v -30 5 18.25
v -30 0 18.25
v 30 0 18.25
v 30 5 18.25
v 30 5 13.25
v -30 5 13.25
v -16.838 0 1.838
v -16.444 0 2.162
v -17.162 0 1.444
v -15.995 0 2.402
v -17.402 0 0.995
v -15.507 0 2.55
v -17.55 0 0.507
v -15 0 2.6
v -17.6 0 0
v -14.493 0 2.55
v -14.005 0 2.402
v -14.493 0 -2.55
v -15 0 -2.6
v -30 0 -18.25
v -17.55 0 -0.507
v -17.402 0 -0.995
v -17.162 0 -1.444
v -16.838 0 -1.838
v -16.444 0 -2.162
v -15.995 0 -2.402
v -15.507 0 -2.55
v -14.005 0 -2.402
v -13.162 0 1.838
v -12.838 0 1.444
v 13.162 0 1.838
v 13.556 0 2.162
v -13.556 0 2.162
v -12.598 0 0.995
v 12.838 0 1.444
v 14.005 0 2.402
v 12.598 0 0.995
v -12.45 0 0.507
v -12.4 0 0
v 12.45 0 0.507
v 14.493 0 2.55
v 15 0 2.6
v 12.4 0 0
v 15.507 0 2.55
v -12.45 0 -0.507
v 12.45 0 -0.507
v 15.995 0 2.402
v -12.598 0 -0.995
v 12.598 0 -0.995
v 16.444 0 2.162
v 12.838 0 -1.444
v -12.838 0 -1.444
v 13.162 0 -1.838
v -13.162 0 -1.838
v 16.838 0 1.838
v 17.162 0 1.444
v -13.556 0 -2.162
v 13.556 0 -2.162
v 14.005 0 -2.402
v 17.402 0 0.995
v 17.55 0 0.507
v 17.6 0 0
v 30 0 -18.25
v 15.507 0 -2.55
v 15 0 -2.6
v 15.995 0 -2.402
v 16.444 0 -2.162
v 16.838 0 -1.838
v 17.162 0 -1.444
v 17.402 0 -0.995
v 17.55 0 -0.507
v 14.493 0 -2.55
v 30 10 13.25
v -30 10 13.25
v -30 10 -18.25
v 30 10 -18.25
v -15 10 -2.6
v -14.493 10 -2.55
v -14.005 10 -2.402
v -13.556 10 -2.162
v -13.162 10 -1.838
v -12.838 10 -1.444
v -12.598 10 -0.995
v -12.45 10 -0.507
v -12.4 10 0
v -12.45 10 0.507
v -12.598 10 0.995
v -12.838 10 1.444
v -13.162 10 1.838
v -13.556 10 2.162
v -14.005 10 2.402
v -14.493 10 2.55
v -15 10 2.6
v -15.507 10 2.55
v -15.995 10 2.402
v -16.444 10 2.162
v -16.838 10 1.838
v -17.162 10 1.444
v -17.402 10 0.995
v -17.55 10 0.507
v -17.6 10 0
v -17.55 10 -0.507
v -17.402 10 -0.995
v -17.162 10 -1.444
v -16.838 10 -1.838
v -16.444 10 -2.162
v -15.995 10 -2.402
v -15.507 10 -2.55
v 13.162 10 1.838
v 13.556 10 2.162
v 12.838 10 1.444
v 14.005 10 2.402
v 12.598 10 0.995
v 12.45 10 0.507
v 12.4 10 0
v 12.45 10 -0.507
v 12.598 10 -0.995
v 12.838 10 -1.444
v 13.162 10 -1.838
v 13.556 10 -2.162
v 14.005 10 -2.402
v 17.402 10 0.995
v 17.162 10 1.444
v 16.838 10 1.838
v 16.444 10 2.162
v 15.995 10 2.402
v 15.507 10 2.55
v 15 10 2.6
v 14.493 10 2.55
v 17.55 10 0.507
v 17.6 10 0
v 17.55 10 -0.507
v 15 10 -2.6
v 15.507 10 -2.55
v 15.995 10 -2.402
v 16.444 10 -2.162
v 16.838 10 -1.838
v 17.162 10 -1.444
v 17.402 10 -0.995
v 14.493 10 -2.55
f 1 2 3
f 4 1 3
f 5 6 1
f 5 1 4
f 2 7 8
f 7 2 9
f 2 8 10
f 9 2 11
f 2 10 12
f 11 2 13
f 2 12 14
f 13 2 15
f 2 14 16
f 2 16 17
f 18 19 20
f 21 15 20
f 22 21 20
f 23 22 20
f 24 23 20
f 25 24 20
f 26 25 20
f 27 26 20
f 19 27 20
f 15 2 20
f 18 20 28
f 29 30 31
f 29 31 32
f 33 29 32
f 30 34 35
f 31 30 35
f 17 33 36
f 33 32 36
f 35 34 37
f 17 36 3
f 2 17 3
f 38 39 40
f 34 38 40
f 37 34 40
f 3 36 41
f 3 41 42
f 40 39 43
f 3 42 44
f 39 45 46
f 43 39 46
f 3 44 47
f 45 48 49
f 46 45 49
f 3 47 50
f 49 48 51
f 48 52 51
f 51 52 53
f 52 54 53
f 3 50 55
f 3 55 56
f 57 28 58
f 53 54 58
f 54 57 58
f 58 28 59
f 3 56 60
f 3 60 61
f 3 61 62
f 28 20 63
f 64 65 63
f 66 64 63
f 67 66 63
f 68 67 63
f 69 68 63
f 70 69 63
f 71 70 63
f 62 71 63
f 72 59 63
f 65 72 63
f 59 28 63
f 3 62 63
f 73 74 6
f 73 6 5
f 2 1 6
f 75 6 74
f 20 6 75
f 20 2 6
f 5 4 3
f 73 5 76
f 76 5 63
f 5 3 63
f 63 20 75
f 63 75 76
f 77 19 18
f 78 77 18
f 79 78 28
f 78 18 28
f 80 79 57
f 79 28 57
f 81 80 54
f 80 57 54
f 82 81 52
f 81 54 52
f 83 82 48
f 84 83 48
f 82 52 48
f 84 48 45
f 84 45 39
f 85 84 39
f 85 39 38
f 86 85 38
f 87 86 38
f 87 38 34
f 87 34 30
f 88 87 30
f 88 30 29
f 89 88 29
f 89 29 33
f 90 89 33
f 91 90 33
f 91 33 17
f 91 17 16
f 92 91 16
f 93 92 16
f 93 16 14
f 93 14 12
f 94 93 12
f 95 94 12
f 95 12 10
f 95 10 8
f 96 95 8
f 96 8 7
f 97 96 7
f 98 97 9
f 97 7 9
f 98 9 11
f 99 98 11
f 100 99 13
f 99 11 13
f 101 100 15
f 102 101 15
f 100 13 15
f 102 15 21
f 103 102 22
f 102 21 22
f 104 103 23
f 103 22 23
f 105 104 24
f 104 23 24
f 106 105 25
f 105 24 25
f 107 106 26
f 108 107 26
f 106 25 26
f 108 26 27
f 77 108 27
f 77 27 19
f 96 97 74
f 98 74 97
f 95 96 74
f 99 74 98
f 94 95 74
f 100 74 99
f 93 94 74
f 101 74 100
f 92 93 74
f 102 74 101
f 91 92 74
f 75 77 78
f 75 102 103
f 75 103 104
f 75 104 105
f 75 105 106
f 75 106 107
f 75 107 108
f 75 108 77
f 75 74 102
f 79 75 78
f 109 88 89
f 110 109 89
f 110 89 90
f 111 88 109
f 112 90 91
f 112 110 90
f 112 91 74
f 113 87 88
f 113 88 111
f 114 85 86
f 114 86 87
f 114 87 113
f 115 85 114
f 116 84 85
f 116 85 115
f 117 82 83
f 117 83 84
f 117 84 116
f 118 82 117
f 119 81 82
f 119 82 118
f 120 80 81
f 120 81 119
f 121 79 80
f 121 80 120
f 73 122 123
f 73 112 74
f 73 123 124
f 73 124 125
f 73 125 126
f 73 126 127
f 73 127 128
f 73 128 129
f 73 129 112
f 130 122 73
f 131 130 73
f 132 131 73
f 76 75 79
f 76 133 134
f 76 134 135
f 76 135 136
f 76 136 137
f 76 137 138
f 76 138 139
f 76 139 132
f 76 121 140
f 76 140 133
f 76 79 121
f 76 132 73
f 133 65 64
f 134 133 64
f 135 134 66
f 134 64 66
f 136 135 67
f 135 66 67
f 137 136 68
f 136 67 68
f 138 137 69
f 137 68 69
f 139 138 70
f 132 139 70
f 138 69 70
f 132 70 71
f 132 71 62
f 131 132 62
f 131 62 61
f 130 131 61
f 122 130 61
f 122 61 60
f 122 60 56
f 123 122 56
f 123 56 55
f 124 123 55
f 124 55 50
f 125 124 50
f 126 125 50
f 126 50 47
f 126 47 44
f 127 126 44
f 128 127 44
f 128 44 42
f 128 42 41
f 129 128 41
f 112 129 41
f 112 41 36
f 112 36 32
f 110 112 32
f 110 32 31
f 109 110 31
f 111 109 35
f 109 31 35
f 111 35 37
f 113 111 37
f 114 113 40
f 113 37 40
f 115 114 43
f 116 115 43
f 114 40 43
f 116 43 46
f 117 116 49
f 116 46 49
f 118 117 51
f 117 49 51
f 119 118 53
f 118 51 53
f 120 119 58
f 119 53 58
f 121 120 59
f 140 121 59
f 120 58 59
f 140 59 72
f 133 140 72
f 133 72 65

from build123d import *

# Parameters (mm, degrees)
SKETCH1_W                   = 60
SKETCH1_H                   = 36.5
BOSS_EXTRUDE1_DEPTH         = 10
SKETCH2_W                   = 60
SKETCH2_H                   = 5
CUT_EXTRUDE1_DEPTH          = 5
TAP_DRILL_FOR_M5_TAP1_D     = 5.2
TAP_DRILL_FOR_M5_TAP1_DEPTH = 46
TAP_DRILL_FOR_M5_TAP1_TIP   = 1.562237609


with BuildPart() as part:
    # Sketch1 → Boss-Extrude1 (new body)
    with BuildSketch(Plane(origin=(0, 0, 0), x_dir=(1, 0, 0), z_dir=(0, 1, 0))):
        Rectangle(SKETCH1_W, SKETCH1_H)
    extrude(amount=BOSS_EXTRUDE1_DEPTH)

    # Sketch2 → Cut-Extrude1 (cut)
    with BuildSketch(Plane(origin=(0, 10, 0), x_dir=(1, 0, 0), z_dir=(0, 1, 0))):
        with Locations((0, -15.75)):
            Rectangle(SKETCH2_W, SKETCH2_H)
    extrude(amount=-CUT_EXTRUDE1_DEPTH, mode=Mode.SUBTRACT)

    # Tap Drill for M5 Tap1
    with Locations(Plane(origin=(-15, 10, 0), x_dir=(0, 0, 1), z_dir=(0, 1, 0))):
        with Locations((0, 0), (0, 30)):
            Hole(TAP_DRILL_FOR_M5_TAP1_D / 2, depth=TAP_DRILL_FOR_M5_TAP1_DEPTH)
            with Locations((0, 0, -(TAP_DRILL_FOR_M5_TAP1_DEPTH + TAP_DRILL_FOR_M5_TAP1_TIP / 2))):  # 118° drill point
                Cone(0, TAP_DRILL_FOR_M5_TAP1_D / 2, TAP_DRILL_FOR_M5_TAP1_TIP, mode=Mode.SUBTRACT)


solid = part.part
